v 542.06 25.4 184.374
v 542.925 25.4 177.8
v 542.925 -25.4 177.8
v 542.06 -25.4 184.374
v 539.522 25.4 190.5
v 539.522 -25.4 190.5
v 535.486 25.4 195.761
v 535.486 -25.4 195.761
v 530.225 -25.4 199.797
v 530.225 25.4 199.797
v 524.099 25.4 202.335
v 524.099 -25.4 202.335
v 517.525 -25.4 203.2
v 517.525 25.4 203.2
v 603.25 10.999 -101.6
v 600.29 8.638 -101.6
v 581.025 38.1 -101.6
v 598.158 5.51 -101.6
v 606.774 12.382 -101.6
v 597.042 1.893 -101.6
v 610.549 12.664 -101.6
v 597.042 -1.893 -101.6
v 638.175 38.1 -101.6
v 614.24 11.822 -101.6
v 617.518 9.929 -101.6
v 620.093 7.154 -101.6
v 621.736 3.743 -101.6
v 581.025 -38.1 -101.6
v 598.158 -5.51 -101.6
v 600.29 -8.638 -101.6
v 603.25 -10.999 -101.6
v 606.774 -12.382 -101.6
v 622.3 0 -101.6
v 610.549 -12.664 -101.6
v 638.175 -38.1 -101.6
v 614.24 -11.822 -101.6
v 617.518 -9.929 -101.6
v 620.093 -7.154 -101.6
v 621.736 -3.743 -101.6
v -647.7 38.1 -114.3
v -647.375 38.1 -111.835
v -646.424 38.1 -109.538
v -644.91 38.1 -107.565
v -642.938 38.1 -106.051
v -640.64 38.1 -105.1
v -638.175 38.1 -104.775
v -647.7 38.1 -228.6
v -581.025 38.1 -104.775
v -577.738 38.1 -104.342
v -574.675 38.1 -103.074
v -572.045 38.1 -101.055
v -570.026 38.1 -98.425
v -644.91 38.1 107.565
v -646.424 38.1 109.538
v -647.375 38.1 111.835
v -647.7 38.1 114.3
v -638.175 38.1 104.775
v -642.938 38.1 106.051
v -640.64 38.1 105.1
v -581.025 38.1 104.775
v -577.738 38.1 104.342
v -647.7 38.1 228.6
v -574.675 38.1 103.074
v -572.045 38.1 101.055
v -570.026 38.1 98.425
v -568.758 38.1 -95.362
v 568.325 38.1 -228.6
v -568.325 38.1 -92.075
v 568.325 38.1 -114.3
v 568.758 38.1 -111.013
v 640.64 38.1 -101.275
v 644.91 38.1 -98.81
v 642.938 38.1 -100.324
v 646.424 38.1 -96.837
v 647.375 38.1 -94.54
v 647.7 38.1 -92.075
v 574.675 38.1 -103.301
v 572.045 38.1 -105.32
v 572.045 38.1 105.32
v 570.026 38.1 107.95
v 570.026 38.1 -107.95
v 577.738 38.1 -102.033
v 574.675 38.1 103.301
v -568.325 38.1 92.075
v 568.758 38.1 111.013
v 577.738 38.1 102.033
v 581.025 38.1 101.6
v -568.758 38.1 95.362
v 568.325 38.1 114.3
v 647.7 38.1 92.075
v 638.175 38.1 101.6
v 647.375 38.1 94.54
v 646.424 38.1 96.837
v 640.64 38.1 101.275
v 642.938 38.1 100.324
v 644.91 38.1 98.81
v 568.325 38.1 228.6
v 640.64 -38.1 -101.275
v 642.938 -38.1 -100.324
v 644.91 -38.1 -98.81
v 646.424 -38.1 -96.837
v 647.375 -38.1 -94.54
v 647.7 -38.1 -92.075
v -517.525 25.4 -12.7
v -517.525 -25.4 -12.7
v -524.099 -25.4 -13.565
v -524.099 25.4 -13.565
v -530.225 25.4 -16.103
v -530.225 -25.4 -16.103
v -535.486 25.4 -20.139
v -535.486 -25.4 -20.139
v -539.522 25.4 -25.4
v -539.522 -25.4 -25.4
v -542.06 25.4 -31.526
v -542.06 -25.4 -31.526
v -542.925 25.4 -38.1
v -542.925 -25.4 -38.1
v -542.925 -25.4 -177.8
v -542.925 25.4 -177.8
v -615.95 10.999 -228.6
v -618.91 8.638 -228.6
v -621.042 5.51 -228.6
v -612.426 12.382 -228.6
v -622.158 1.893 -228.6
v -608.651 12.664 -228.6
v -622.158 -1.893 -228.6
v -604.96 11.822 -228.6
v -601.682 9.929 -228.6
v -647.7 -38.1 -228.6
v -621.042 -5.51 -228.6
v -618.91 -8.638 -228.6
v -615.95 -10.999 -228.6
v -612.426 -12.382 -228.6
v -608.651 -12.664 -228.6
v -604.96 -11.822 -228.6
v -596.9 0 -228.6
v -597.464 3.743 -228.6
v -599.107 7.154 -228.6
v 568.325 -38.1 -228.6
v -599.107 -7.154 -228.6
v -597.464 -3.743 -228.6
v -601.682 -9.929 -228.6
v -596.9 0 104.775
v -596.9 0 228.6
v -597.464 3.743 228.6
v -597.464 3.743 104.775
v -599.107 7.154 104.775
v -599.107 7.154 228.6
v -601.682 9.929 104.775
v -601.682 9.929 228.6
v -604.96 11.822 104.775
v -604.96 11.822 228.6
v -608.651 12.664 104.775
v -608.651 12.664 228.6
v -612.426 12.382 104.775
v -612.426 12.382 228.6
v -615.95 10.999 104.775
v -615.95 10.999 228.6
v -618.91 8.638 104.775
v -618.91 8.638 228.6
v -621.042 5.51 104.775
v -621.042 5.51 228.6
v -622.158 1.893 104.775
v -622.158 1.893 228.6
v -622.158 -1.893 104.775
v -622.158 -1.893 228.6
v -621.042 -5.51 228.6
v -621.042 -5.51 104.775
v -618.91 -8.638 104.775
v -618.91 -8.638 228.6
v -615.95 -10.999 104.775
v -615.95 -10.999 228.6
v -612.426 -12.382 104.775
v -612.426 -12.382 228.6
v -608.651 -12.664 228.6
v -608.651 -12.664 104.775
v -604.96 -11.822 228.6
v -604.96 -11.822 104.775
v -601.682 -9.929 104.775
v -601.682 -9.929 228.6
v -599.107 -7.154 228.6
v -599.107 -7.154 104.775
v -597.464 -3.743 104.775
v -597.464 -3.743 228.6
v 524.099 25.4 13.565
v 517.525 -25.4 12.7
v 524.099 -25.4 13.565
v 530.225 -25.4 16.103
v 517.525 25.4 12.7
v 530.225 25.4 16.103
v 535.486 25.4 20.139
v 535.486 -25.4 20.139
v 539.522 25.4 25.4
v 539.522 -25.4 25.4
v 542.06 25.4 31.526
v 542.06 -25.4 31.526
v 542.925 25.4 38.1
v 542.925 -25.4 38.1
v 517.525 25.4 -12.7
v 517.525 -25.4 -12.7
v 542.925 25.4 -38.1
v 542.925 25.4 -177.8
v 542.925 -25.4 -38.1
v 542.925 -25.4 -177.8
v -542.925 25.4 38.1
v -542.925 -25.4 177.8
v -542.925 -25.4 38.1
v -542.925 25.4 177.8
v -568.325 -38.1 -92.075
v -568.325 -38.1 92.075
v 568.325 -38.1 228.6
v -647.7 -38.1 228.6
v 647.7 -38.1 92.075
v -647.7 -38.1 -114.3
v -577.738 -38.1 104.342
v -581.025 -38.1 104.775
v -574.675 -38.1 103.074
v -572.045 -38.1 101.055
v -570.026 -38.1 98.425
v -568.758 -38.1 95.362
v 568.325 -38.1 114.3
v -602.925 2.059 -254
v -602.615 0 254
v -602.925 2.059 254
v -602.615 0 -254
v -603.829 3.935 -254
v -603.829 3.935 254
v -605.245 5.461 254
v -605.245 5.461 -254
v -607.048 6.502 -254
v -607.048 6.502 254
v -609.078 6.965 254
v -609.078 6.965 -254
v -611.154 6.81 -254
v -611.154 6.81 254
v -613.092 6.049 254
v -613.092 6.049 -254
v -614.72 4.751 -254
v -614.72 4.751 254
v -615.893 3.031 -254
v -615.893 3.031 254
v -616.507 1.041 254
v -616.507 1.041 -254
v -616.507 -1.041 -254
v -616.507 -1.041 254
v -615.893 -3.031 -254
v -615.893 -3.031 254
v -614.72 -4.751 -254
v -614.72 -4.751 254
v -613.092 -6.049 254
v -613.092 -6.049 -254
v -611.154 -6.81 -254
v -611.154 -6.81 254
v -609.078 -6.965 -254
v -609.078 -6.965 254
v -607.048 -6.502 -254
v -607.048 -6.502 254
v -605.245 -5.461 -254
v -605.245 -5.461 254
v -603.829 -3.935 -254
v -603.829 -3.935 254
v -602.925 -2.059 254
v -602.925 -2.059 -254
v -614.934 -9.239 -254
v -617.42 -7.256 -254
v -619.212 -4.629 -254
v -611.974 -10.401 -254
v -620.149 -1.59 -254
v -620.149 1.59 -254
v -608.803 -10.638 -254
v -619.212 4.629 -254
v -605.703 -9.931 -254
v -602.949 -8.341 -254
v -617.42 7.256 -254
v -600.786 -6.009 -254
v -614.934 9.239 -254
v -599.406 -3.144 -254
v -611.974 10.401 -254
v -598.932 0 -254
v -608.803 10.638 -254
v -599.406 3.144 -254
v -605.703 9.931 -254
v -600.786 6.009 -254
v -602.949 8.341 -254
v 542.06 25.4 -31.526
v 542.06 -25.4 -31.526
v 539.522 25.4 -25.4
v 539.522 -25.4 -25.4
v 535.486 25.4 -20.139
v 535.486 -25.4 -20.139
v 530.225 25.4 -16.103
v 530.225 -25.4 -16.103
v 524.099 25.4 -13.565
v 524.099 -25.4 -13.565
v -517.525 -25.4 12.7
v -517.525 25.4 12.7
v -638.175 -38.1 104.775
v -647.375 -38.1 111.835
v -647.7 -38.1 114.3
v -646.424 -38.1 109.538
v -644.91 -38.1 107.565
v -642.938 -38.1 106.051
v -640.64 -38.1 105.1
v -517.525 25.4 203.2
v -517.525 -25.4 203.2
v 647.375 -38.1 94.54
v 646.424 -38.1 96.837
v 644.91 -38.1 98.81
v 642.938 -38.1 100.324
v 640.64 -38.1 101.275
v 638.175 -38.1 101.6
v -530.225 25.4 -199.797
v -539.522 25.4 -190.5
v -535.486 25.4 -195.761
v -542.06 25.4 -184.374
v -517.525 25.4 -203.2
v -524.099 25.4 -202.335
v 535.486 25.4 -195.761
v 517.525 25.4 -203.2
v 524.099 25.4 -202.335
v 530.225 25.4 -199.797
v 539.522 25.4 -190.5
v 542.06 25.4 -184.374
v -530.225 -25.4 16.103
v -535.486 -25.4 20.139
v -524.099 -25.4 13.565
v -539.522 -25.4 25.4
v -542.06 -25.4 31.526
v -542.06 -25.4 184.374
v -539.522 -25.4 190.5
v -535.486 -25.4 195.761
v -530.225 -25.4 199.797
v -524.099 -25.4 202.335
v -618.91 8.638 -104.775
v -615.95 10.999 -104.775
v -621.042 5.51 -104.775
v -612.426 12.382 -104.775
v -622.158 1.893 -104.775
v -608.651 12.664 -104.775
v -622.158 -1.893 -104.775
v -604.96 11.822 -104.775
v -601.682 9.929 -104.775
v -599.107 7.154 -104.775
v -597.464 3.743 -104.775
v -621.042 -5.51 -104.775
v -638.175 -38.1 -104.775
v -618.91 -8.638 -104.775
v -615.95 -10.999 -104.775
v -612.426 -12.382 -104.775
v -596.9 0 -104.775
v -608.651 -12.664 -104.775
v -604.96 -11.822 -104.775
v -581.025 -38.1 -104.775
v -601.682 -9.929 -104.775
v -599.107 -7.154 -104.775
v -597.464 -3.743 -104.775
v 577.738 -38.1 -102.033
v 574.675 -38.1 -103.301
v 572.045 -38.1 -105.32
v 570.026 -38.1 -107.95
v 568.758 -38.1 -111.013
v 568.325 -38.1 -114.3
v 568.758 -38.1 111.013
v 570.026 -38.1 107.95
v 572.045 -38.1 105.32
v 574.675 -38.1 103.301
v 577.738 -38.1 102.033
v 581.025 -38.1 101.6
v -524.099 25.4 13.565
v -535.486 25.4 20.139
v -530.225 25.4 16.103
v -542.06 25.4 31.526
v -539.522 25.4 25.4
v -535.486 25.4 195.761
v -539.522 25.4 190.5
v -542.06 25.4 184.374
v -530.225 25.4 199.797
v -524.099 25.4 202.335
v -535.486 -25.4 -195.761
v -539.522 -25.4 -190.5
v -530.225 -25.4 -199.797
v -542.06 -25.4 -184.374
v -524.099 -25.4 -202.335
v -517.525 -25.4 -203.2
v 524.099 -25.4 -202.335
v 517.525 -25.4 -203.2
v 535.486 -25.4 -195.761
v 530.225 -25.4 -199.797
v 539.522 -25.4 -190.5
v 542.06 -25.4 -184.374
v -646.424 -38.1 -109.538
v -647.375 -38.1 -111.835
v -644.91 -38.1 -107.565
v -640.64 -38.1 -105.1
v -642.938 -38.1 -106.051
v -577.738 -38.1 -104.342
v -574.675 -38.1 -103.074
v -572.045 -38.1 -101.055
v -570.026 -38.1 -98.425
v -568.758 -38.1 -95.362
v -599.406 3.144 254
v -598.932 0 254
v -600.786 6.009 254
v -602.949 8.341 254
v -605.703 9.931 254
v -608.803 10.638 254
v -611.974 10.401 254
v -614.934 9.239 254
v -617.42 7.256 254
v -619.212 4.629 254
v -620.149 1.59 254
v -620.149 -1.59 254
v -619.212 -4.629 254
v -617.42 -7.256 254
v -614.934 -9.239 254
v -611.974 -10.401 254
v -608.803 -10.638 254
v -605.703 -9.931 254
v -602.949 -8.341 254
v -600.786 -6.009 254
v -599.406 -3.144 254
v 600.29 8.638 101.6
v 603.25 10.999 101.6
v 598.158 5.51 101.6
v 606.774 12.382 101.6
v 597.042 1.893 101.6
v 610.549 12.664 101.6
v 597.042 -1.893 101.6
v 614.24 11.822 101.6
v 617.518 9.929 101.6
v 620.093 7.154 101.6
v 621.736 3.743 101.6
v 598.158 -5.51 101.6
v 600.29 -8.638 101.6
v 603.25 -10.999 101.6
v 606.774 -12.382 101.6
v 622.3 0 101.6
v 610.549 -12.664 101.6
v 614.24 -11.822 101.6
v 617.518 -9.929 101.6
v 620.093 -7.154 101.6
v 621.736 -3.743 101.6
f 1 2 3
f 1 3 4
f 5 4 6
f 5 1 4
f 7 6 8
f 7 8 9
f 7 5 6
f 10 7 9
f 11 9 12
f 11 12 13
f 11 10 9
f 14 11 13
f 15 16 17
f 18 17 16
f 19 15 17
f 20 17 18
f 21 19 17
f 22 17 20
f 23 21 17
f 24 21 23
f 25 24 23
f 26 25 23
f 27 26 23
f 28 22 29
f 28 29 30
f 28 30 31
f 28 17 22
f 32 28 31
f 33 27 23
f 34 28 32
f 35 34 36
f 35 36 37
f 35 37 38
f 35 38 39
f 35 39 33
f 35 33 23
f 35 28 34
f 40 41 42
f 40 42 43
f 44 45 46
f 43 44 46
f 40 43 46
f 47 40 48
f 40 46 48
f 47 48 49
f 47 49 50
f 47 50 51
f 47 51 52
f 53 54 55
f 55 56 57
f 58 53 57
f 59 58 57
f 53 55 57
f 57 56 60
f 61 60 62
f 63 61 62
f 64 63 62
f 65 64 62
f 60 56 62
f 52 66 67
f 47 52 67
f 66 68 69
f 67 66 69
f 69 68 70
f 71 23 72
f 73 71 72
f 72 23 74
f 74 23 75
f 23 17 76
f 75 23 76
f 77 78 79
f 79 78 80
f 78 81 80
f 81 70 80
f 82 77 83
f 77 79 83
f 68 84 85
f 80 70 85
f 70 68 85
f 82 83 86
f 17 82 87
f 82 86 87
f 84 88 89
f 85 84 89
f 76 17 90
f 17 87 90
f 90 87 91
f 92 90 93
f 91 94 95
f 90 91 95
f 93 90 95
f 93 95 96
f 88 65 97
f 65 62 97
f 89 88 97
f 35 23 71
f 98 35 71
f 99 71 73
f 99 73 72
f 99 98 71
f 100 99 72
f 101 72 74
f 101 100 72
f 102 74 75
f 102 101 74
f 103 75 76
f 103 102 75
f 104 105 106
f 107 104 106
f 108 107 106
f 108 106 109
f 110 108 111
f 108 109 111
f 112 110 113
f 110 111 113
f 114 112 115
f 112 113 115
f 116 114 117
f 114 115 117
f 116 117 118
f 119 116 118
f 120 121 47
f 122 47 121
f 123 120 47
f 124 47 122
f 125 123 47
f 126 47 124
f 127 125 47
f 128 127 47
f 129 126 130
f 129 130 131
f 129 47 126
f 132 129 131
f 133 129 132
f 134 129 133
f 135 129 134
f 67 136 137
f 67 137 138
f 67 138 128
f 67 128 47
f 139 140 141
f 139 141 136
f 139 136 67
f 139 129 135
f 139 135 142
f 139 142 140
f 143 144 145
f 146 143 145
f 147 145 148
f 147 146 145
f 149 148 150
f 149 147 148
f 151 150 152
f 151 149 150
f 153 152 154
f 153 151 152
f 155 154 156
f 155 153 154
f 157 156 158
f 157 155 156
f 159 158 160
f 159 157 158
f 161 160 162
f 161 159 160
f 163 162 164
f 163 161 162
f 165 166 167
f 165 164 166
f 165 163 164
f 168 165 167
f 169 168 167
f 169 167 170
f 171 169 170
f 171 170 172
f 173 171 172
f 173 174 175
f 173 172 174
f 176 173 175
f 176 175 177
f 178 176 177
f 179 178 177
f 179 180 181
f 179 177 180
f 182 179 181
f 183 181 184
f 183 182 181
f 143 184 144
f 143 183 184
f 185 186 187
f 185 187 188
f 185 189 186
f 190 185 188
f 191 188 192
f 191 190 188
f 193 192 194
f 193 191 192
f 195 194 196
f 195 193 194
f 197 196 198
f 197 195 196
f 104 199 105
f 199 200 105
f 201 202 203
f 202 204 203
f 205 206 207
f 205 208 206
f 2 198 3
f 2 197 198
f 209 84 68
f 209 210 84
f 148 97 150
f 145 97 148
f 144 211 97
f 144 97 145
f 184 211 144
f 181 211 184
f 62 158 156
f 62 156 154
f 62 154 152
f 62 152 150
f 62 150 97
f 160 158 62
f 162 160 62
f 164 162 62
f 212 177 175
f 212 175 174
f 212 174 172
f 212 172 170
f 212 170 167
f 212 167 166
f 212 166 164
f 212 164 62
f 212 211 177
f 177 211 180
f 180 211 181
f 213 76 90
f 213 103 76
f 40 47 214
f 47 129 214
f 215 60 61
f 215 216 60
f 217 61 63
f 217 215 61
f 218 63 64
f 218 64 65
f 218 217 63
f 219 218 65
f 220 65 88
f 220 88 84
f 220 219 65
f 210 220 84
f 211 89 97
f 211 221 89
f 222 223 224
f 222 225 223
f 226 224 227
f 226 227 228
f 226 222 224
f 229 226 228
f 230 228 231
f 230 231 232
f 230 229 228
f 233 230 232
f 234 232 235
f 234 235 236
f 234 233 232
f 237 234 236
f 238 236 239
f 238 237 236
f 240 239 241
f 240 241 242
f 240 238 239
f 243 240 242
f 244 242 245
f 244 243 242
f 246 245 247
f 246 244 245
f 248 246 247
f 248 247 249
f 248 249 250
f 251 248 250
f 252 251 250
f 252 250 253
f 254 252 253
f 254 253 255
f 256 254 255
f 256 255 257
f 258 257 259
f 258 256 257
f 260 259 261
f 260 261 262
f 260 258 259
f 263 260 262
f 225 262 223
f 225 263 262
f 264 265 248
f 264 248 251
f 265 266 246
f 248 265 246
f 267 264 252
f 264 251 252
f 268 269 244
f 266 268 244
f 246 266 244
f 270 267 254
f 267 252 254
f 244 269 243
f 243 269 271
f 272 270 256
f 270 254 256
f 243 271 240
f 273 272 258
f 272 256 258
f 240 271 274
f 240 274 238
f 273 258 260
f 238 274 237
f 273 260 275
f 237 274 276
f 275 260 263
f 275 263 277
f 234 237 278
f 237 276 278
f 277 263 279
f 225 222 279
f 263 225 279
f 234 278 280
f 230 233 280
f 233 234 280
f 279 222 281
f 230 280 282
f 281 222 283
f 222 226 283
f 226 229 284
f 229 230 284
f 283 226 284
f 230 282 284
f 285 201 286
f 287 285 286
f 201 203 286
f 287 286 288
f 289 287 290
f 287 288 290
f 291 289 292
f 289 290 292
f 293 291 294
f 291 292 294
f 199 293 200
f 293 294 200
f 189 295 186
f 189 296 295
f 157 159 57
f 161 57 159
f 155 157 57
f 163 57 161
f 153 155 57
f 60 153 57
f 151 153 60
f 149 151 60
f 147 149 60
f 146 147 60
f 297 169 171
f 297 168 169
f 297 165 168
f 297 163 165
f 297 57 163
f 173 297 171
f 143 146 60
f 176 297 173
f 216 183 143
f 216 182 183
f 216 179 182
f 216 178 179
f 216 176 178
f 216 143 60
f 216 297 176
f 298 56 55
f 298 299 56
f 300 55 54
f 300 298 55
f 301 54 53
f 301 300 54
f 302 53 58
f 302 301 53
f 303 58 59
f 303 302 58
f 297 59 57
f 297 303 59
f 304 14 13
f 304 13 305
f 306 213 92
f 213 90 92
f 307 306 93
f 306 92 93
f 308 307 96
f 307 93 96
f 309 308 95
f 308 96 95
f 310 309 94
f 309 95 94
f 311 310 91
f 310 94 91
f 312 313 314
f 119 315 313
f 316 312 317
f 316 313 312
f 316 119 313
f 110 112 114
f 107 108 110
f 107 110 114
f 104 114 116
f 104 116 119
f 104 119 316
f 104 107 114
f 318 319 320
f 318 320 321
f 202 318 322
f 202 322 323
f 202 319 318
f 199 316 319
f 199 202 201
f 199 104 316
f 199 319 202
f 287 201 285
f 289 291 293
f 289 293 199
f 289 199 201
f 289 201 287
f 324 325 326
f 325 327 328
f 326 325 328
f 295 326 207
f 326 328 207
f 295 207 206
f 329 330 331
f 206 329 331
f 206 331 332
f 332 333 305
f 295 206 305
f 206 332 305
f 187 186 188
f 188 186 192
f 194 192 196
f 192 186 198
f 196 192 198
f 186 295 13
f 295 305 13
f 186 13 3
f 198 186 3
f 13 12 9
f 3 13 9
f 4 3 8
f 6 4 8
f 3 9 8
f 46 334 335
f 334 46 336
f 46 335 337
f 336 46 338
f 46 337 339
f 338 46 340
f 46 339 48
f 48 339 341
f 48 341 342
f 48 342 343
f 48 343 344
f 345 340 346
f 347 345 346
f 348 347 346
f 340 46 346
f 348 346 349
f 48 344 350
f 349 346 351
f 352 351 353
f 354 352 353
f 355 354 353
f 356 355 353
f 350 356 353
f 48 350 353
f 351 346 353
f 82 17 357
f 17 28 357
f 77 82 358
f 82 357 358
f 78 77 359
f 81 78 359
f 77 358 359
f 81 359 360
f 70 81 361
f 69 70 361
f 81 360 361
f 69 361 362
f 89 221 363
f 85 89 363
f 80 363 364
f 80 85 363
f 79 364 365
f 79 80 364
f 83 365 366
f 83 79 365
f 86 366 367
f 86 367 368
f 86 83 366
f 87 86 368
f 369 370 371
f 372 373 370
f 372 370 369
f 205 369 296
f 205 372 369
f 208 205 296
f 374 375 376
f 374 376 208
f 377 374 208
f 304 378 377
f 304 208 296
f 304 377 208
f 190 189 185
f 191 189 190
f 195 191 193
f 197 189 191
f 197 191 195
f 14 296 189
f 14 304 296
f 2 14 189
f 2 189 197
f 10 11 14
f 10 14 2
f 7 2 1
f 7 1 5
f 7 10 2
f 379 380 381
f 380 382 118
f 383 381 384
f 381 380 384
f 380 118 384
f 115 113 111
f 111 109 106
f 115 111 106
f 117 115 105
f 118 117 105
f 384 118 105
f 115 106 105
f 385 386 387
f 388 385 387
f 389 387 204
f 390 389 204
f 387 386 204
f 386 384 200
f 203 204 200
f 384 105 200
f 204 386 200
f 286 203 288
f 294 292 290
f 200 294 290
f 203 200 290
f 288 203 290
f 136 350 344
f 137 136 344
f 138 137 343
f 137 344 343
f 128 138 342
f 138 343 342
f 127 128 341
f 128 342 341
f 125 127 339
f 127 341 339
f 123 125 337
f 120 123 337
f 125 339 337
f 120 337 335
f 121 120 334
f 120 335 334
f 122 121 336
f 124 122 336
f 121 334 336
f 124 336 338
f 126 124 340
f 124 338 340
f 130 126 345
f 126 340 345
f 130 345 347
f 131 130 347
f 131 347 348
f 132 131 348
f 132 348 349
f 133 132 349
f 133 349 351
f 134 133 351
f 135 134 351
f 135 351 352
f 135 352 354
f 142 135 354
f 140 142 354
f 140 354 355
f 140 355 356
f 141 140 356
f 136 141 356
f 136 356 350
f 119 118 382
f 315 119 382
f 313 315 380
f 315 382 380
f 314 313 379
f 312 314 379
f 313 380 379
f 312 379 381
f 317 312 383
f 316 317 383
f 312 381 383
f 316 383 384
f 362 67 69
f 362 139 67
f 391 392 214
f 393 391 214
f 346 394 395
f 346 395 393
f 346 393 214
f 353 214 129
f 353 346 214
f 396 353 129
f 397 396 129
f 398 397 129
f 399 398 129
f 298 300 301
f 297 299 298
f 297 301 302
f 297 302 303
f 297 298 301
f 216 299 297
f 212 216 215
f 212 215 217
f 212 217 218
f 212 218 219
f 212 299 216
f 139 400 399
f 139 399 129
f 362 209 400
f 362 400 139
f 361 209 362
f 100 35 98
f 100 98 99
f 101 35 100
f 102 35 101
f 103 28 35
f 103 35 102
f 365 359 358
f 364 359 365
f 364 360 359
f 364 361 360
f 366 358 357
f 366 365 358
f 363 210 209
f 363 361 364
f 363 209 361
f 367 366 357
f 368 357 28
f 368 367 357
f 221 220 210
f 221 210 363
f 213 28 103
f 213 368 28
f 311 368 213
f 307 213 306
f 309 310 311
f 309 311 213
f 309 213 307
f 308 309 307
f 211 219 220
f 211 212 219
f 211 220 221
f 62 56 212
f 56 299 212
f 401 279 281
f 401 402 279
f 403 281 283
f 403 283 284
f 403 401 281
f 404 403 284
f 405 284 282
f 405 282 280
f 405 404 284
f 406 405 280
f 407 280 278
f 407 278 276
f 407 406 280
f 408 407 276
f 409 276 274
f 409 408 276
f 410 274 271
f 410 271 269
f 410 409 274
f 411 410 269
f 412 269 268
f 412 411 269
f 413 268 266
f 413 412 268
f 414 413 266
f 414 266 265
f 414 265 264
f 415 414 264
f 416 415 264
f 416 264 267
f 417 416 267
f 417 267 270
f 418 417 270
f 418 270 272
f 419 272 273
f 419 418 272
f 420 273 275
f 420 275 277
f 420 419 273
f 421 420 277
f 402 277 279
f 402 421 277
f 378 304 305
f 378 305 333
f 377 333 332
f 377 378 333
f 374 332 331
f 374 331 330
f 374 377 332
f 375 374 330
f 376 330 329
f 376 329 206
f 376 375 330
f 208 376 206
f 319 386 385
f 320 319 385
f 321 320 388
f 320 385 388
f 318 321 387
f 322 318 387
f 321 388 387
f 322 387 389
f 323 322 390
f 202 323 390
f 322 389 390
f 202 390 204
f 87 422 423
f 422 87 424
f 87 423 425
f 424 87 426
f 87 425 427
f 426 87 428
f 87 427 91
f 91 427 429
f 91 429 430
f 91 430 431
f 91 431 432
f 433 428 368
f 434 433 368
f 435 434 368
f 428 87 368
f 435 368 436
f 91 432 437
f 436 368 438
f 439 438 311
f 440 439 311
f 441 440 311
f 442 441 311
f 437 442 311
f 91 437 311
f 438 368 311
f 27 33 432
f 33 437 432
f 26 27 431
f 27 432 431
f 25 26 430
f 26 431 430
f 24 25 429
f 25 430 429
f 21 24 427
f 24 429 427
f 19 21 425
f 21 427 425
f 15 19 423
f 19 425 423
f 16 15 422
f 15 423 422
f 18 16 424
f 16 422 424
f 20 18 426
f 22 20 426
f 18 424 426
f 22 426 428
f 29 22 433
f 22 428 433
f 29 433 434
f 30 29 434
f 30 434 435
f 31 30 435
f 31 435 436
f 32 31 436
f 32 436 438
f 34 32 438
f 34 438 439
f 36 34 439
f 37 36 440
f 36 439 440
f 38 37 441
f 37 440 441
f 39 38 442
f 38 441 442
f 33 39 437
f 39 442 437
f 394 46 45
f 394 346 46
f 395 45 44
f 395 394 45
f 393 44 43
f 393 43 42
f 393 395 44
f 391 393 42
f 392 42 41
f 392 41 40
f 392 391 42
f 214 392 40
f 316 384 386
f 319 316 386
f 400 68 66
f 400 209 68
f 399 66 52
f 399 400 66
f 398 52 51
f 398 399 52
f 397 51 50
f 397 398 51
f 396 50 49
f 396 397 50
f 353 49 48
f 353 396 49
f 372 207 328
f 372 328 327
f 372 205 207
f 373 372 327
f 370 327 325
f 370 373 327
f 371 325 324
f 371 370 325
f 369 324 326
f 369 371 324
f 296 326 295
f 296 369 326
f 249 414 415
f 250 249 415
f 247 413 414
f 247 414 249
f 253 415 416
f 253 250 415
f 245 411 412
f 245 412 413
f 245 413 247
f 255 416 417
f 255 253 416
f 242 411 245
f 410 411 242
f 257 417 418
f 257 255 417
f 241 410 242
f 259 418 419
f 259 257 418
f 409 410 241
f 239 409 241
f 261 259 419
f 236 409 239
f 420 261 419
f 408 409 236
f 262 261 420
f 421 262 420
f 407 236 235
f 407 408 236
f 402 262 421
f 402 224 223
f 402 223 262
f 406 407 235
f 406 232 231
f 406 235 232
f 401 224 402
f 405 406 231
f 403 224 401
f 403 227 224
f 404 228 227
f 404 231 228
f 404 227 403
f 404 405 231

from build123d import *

# Parameters (mm, degrees)
F0_W     = 79.375
F0_H     = 123.825
F0_H_2   = 203.2
F1_DEPTH = 38.1
F2_R     = 12.7
F3_DEPTH = 254
F4_R     = 9.525
F5_R     = 12.7
F7_DEPTH = 25.4
F8_R     = 10.668
F8_R_2   = 6.985
F9_DEPTH = 254


with BuildPart() as f1:
    # F0 (on Front) → F1 (new body, symmetric)
    with BuildSketch(Plane.XZ):
        Polygon((568.325, 228.6), (-568.325, 228.6), (-568.325, 104.775), (-568.325, -104.775), (-568.325, -228.6), (568.325, -228.6), (568.325, -101.6), (568.325, 101.6), align=None)
        with Locations((-608.0125, 166.6875)):
            Rectangle(F0_W, F0_H)
        with Locations((608.0125, 0)):
            Rectangle(F0_W, F0_H_2)
        with Locations((-608.0125, -166.6875)):
            Rectangle(F0_W, F0_H)
    extrude(amount=F1_DEPTH, both=True)

    # F2 (on Top) → F3 (cut, symmetric)
    with BuildSketch(Plane.XY):
        with Locations((-609.6, 0)):
            Circle(F2_R)
        with Locations((609.6, 0)):
            Circle(F2_R)
    extrude(amount=F3_DEPTH, both=True, mode=Mode.SUBTRACT)

    # F4
    f4_edges = [f1.edges().sort_by_distance(p)[0] for p in [
        (647.7, 0, 101.6),
        (647.7, 0, -101.6),
        (-647.7, 0, 104.775),
        (-647.7, 0, -104.775),
    ]]
    fillet(f4_edges, radius=F4_R)

    # F5
    f5_edges = [f1.edges().sort_by_distance(p)[0] for p in [
        (-568.325, 0, 104.775),
        (-568.325, 0, -104.775),
        (568.325, 0, -101.6),
        (568.325, 0, 101.6),
    ]]
    fillet(f5_edges, radius=F5_R)

    # F6 (on Front) → F7 (cut, symmetric)
    with BuildSketch(Plane.XZ):
        with BuildLine():
            Line((-38.1, 203.2), (-517.525, 203.2))
            ThreePointArc((-517.525, 203.2), (-535.4855122421, 195.7605122421), (-542.925, 177.8))
            Line((-542.925, 177.8), (-542.925, 38.1))
            ThreePointArc((-542.925, 38.1), (-535.4855122421, 20.1394877579), (-517.525, 12.7))
            Line((-517.525, 12.7), (-38.1, 12.7))
            ThreePointArc((-38.1, 12.7), (-20.1394877579, 20.1394877579), (-12.7, 38.1))
            Line((-12.7, 38.1), (-12.7, 177.8))
            ThreePointArc((-12.7, 177.8), (-20.1394877579, 195.7605122421), (-38.1, 203.2))
        make_face()
        with BuildLine():
            Line((38.1, 203.2), (-38.1, 203.2))
            ThreePointArc((-38.1, 203.2), (-20.1394877579, 195.7605122421), (-12.7, 177.8))
            Line((-12.7, 177.8), (-12.7, 38.1))
            ThreePointArc((-12.7, 38.1), (-20.1394877579, 20.1394877579), (-38.1, 12.7))
            Line((-38.1, 12.7), (38.1, 12.7))
            ThreePointArc((38.1, 12.7), (20.1394877579, 20.1394877579), (12.7, 38.1))
            Line((12.7, 38.1), (12.7, 177.8))
            ThreePointArc((12.7, 177.8), (20.1394877579, 195.7605122421), (38.1, 203.2))
        make_face()
        with BuildLine():
            Line((517.525, 203.2), (38.1, 203.2))
            ThreePointArc((38.1, 203.2), (20.1394877579, 195.7605122421), (12.7, 177.8))
            Line((12.7, 177.8), (12.7, 38.1))
            ThreePointArc((12.7, 38.1), (20.1394877579, 20.1394877579), (38.1, 12.7))
            Line((38.1, 12.7), (517.525, 12.7))
            ThreePointArc((517.525, 12.7), (535.4855122421, 20.1394877579), (542.925, 38.1))
            Line((542.925, 38.1), (542.925, 177.8))
            ThreePointArc((542.925, 177.8), (535.4855122421, 195.7605122421), (517.525, 203.2))
        make_face()
        with BuildLine():
            Line((517.525, -12.7), (38.1, -12.7))
            ThreePointArc((38.1, -12.7), (20.1394877579, -20.1394877579), (12.7, -38.1))
            Line((12.7, -38.1), (12.7, -177.8))
            ThreePointArc((12.7, -177.8), (20.1394877579, -195.7605122421), (38.1, -203.2))
            Line((38.1, -203.2), (517.525, -203.2))
            ThreePointArc((517.525, -203.2), (535.4855122421, -195.7605122421), (542.925, -177.8))
            Line((542.925, -177.8), (542.925, -38.1))
            ThreePointArc((542.925, -38.1), (535.4855122421, -20.1394877579), (517.525, -12.7))
        make_face()
        with BuildLine():
            ThreePointArc((12.7, -38.1), (20.1394877579, -20.1394877579), (38.1, -12.7))
            Line((38.1, -12.7), (-38.1, -12.7))
            ThreePointArc((-38.1, -12.7), (-20.1394877579, -20.1394877579), (-12.7, -38.1))
            Line((-12.7, -38.1), (-12.7, -177.8))
            ThreePointArc((-12.7, -177.8), (-20.1394877579, -195.7605122421), (-38.1, -203.2))
            Line((-38.1, -203.2), (38.1, -203.2))
            ThreePointArc((38.1, -203.2), (20.1394877579, -195.7605122421), (12.7, -177.8))
            Line((12.7, -177.8), (12.7, -38.1))
        make_face()
        with BuildLine():
            ThreePointArc((-12.7, -38.1), (-20.1394877579, -20.1394877579), (-38.1, -12.7))
            Line((-38.1, -12.7), (-517.525, -12.7))
            ThreePointArc((-517.525, -12.7), (-535.4855122421, -20.1394877579), (-542.925, -38.1))
            Line((-542.925, -38.1), (-542.925, -177.8))
            ThreePointArc((-542.925, -177.8), (-535.4855122421, -195.7605122421), (-517.525, -203.2))
            Line((-517.525, -203.2), (-38.1, -203.2))
            ThreePointArc((-38.1, -203.2), (-20.1394877579, -195.7605122421), (-12.7, -177.8))
            Line((-12.7, -177.8), (-12.7, -38.1))
        make_face()
    extrude(amount=F7_DEPTH, both=True, mode=Mode.SUBTRACT)


with BuildPart() as f9:
    # F8 (on Top) → F9 (new body, symmetric)
    with BuildSketch(Plane.XY):
        with Locations((-609.6, 0)):
            Circle(F8_R)
        with Locations((-609.6, 0)):
            Circle(F8_R_2, mode=Mode.SUBTRACT)
    extrude(amount=F9_DEPTH, both=True)


solid = Compound([f1.part, f9.part])
